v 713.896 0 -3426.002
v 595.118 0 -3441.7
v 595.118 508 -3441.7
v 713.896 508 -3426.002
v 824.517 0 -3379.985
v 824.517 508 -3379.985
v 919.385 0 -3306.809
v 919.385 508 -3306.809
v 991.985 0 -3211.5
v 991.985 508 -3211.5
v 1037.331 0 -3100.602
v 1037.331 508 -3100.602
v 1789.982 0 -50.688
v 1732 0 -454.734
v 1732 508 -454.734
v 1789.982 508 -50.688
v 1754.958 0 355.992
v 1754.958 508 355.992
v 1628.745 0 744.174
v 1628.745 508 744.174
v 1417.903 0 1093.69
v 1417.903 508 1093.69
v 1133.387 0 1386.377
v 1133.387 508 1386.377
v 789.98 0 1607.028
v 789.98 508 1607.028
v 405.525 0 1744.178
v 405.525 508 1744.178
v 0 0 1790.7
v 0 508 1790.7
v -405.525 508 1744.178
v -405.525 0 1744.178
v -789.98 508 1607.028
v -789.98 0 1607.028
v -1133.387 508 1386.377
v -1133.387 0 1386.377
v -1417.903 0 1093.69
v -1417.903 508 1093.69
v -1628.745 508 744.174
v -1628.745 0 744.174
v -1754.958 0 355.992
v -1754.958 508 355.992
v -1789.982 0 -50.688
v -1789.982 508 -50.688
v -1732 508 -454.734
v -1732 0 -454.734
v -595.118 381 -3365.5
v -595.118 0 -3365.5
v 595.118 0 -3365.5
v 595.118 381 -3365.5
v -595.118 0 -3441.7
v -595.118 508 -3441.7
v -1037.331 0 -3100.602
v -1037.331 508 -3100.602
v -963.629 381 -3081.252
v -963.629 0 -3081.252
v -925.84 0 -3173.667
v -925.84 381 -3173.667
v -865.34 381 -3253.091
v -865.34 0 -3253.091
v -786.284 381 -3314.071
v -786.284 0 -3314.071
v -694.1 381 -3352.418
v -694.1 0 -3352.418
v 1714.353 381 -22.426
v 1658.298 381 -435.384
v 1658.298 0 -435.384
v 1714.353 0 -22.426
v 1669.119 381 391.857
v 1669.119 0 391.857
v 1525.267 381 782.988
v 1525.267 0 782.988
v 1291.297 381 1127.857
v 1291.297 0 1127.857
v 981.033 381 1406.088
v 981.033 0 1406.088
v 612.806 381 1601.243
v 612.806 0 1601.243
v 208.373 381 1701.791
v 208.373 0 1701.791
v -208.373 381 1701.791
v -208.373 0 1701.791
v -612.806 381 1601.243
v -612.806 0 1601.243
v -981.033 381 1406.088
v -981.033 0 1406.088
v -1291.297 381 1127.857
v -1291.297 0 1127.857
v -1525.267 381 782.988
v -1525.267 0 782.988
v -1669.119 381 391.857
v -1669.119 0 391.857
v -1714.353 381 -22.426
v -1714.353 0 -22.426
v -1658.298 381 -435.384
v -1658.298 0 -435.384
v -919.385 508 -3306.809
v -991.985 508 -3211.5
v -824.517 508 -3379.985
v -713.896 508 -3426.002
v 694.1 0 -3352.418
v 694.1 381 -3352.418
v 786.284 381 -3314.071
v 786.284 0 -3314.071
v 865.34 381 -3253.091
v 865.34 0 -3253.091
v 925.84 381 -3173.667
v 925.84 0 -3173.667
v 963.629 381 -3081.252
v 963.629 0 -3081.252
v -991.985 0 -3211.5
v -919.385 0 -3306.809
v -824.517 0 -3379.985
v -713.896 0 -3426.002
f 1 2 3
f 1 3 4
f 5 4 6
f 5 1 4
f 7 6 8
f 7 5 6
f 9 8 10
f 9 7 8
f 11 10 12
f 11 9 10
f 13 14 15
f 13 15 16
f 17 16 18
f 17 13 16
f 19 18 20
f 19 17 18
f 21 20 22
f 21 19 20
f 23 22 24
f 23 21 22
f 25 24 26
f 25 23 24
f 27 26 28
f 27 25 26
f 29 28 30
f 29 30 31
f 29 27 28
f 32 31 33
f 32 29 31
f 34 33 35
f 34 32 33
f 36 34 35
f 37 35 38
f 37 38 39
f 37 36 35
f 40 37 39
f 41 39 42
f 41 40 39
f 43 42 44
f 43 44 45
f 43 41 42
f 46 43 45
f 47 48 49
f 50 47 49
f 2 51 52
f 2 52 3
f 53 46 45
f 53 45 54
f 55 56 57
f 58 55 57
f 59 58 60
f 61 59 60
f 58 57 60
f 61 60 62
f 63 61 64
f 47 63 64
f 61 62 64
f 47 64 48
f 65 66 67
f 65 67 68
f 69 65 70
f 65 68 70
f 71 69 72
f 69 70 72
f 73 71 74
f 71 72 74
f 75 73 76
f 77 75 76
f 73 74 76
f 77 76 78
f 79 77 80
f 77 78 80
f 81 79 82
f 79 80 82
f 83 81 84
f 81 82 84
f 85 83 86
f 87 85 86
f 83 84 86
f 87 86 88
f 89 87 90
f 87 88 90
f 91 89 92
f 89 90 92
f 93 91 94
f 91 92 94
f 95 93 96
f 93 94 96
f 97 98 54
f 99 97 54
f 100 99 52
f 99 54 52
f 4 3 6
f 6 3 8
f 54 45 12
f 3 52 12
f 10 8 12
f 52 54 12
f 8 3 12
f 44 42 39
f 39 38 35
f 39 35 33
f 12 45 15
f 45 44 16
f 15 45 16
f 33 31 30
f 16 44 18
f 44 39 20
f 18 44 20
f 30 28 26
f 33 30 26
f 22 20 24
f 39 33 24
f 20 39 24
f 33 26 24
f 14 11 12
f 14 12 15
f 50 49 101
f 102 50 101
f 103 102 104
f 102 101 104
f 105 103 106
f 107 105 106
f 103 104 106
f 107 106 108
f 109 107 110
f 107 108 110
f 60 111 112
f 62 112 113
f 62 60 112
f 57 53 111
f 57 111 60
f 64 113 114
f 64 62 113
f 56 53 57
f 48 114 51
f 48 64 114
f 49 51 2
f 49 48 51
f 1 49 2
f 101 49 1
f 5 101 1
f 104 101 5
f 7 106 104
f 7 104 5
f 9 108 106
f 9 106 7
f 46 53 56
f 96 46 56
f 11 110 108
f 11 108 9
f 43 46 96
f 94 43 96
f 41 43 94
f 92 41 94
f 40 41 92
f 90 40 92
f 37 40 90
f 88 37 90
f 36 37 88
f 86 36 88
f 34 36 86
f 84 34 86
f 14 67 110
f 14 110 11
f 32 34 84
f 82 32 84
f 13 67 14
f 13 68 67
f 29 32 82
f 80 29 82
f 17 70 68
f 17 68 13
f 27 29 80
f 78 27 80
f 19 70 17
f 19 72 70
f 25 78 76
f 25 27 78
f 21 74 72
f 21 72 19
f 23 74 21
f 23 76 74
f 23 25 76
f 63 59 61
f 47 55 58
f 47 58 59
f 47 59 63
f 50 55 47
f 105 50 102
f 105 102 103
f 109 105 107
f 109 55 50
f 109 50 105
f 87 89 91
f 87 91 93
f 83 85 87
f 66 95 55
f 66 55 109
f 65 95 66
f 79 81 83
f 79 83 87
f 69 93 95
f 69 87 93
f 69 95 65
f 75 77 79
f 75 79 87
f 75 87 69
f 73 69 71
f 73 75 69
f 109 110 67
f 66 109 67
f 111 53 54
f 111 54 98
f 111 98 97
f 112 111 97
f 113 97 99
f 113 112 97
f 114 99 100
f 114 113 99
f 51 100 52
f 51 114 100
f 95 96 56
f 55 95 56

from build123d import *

# Parameters (mm, degrees)
F1_DEPTH = 508
F2_DEPTH = 381


# Not quite as in the source:
# - a feature of the source that left no trace in its solid (it failed there, or was rolled back) is left out


with BuildPart() as f1:
    # F0 (on Front) → F1 (new body)
    with BuildSketch(Plane.XZ):
        with BuildLine():
            Line((1456.3986319797, -1504.4493615516), (1731.9998491091, -454.7340021221))
            ThreePointArc((1731.9998491091, -454.7340021221), (0, 1790.7), (-1731.9998491091, -454.7340021221))
            Line((-1731.9998491091, -454.7340021221), (-1456.3986319797, -1504.4493615516))
            Line((-1456.3986319797, -1504.4493615516), (-1356.3676447382, -1885.4493615516))
            Line((-1356.3676447382, -1885.4493615516), (-1156.3056702552, -2647.4493615516))
            Line((-1156.3056702552, -2647.4493615516), (-1056.2746830137, -3028.4493615516))
            Line((-1056.2746830137, -3028.4493615516), (-1037.3310360144, -3100.6022984142))
            ThreePointArc((-1037.3310360144, -3100.6022984142), (-874.3582315562, -3346.5178247234), (-595.1183085823, -3441.7))
            Line((-595.1183085823, -3441.7), (595.1183085823, -3441.7))
            ThreePointArc((595.1183085823, -3441.7), (874.3582315562, -3346.5178247234), (1037.3310360144, -3100.6022984142))
            Line((1037.3310360144, -3100.6022984142), (1056.2746830137, -3028.4493615516))
            Line((1056.2746830137, -3028.4493615516), (1156.3056702552, -2647.4493615516))
            Line((1156.3056702552, -2647.4493615516), (1356.3676447382, -1885.4493615516))
            Line((1356.3676447382, -1885.4493615516), (1456.3986319797, -1504.4493615516))
        make_face()
        with BuildLine():
            ThreePointArc((-1658.2977278704, -435.3836190531), (0, 1714.5), (1658.2977278704, -435.3836190531))
            Line((1658.2977278704, -435.3836190531), (963.6289147757, -3081.2519153451))
            ThreePointArc((963.6289147757, -3081.2519153451), (827.8182443939, -3286.1815206028), (595.1183085823, -3365.5))
            Line((595.1183085823, -3365.5), (-595.1183085823, -3365.5))
            ThreePointArc((-595.1183085823, -3365.5), (-827.8182443939, -3286.1815206028), (-963.6289147757, -3081.2519153451))
            Line((-963.6289147757, -3081.2519153451), (-1658.2977278704, -435.3836190531))
        make_face(mode=Mode.SUBTRACT)
        with BuildLine():
            Line((963.6289147757, -3081.2519153451), (1658.2977278704, -435.3836190531))
            ThreePointArc((1658.2977278704, -435.3836190531), (0, 1714.5), (-1658.2977278704, -435.3836190531))
            Line((-1658.2977278704, -435.3836190531), (-963.6289147757, -3081.2519153451))
            ThreePointArc((-963.6289147757, -3081.2519153451), (-827.8182443939, -3286.1815206028), (-595.1183085823, -3365.5))
            Line((-595.1183085823, -3365.5), (595.1183085823, -3365.5))
            ThreePointArc((595.1183085823, -3365.5), (827.8182443939, -3286.1815206028), (963.6289147757, -3081.2519153451))
        make_face()
    extrude(amount=-F1_DEPTH)

    # F0 (on Front) → F2 (cut)
    with BuildSketch(Plane.XZ):
        with BuildLine():
            Line((963.6289147757, -3081.2519153451), (1658.2977278704, -435.3836190531))
            ThreePointArc((1658.2977278704, -435.3836190531), (0, 1714.5), (-1658.2977278704, -435.3836190531))
            Line((-1658.2977278704, -435.3836190531), (-963.6289147757, -3081.2519153451))
            ThreePointArc((-963.6289147757, -3081.2519153451), (-827.8182443939, -3286.1815206028), (-595.1183085823, -3365.5))
            Line((-595.1183085823, -3365.5), (595.1183085823, -3365.5))
            ThreePointArc((595.1183085823, -3365.5), (827.8182443939, -3286.1815206028), (963.6289147757, -3081.2519153451))
        make_face()
    extrude(amount=-F2_DEPTH, mode=Mode.SUBTRACT)


solid = f1.part
